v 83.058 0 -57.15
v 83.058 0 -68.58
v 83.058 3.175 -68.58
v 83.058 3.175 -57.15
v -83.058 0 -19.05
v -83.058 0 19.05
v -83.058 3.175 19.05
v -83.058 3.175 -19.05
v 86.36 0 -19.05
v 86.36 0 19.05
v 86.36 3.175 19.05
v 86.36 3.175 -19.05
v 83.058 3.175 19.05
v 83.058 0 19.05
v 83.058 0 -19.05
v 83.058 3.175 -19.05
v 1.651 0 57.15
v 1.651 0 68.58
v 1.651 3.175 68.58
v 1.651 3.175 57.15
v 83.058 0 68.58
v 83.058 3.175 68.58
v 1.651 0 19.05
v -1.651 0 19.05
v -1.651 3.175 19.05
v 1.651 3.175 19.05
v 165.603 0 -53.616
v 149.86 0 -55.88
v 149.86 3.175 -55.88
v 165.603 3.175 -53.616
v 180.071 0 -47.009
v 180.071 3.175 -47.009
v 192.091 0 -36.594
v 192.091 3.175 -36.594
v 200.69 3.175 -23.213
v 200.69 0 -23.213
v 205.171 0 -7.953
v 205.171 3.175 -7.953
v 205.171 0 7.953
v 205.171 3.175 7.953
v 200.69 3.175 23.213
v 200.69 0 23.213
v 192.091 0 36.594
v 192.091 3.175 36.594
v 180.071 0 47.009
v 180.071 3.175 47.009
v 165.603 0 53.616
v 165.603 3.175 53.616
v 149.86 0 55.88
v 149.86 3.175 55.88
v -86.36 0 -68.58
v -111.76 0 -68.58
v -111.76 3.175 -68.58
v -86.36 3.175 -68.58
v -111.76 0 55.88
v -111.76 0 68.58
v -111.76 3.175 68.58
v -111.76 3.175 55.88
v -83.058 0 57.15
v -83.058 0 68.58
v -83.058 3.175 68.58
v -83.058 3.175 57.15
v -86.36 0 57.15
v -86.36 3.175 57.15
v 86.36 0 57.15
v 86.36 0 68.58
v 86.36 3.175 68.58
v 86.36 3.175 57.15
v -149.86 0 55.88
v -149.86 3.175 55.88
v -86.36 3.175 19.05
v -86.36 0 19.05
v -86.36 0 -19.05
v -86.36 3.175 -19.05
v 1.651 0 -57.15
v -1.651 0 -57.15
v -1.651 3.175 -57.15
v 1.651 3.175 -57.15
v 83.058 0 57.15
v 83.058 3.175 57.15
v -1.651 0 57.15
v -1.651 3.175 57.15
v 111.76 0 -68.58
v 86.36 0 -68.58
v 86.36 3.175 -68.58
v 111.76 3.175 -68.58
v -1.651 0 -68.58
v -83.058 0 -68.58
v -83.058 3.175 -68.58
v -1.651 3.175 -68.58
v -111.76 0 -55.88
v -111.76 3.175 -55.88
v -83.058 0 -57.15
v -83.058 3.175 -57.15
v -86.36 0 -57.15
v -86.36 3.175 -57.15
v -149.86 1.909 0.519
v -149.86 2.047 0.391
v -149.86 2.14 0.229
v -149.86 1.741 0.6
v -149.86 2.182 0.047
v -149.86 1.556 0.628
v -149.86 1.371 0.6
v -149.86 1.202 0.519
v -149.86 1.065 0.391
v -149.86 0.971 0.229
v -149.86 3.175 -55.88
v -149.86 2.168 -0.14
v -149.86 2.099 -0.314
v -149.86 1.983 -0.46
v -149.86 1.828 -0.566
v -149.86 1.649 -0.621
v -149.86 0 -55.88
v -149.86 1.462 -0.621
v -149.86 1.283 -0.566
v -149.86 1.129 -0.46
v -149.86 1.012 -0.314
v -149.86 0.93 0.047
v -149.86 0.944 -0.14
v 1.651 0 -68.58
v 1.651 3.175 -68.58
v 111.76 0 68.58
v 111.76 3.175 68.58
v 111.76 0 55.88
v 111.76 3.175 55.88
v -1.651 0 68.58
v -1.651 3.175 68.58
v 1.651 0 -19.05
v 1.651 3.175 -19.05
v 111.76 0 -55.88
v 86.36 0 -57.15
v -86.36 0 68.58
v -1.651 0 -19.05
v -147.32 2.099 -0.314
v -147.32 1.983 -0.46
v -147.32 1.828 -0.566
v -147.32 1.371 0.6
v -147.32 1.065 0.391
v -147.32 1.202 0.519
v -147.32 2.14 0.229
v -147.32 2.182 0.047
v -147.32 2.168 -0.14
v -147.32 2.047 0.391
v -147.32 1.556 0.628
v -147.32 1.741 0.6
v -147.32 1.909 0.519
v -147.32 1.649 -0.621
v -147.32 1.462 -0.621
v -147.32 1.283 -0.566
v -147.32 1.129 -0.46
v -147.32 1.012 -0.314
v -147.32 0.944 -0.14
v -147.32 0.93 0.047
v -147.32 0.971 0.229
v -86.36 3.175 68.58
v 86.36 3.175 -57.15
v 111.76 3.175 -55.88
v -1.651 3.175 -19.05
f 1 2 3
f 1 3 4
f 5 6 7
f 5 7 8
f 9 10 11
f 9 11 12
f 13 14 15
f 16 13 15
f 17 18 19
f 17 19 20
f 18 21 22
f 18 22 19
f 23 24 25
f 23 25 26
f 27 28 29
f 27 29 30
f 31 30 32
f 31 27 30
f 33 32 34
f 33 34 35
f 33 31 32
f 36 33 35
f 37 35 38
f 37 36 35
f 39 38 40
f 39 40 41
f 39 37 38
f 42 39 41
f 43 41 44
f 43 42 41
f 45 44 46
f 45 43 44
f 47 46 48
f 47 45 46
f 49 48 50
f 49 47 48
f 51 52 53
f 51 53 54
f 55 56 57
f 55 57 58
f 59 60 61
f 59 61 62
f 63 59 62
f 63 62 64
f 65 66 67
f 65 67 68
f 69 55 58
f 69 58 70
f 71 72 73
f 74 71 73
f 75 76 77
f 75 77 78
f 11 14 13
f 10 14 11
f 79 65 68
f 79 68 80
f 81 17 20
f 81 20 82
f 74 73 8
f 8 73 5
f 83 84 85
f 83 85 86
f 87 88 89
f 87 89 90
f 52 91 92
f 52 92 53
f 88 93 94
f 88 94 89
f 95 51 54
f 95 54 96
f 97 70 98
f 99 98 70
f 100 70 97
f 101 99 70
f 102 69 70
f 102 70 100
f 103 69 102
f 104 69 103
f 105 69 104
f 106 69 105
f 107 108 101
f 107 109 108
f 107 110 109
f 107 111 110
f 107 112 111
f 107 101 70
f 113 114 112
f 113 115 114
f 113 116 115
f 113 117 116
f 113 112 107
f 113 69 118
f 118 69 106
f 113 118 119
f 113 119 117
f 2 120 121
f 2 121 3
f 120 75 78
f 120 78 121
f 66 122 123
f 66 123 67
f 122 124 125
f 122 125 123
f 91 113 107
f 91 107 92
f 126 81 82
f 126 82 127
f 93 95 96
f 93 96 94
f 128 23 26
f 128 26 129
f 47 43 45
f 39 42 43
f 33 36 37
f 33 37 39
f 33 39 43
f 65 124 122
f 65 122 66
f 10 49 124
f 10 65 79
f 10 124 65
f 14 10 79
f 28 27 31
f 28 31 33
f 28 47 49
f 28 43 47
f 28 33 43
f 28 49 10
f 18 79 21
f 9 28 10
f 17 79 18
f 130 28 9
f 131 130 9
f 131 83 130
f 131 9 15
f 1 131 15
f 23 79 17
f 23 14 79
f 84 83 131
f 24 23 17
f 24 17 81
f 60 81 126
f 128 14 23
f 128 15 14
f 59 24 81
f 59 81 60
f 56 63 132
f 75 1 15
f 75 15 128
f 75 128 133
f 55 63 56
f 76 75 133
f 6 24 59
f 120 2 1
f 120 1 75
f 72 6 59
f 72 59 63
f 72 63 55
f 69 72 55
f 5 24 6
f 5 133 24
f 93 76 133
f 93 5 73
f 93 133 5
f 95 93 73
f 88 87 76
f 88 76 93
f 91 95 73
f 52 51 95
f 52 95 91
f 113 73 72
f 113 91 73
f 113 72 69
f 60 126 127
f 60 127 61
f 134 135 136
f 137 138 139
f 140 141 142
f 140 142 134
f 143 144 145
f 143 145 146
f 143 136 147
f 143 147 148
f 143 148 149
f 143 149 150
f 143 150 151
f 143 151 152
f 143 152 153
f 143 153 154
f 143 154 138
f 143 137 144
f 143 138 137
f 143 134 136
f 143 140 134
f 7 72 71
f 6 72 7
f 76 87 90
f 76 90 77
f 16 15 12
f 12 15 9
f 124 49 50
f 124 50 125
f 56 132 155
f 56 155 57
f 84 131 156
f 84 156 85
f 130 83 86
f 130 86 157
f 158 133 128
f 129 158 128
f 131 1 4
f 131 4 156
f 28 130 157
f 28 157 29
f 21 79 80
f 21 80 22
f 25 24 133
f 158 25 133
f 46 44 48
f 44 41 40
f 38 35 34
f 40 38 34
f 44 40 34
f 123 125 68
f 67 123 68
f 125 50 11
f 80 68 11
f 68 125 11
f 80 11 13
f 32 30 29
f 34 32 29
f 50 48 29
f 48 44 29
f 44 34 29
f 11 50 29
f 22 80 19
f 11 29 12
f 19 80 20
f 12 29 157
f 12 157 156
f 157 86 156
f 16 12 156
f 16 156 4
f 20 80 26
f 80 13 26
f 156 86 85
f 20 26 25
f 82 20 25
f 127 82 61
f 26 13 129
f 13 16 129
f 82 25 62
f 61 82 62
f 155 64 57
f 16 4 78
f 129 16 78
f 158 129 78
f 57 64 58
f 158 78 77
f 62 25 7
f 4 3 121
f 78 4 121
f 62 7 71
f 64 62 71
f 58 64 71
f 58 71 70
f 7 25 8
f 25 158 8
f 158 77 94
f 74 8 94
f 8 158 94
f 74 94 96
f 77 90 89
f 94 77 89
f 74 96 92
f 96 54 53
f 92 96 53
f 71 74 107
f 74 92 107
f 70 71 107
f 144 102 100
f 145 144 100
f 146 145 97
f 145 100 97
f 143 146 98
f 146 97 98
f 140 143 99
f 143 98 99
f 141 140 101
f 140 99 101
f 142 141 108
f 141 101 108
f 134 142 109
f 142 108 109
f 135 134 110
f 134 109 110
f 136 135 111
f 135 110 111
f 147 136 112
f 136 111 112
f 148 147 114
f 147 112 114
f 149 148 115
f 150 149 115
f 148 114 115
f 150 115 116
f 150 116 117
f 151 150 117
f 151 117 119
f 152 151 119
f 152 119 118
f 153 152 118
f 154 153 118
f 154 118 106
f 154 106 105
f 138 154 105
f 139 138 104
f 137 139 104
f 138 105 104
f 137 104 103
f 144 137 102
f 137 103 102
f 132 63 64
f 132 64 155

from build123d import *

# Parameters (mm, degrees)
SKETCH1_W           = 3.302
SKETCH1_H           = 38.1
BOSS_EXTRUDE1_DEPTH = 3.175
SKETCH2_R           = 0.627804746
CUT_EXTRUDE1_DEPTH  = 2.54


with BuildPart() as part:
    # Sketch1 → Boss-Extrude1 (new body)
    with BuildSketch(Plane(origin=(0, 0, 0), x_dir=(1, 0, 0), z_dir=(0, 1, 0))):
        with BuildLine():
            Line((-149.86, -55.88), (-149.86, 55.88))
            Line((-149.86, 55.88), (-111.76, 55.88))
            Line((-111.76, 55.88), (-111.76, 68.58))
            Line((-111.76, 68.58), (-86.36, 68.58))
            Line((-86.36, 68.58), (-86.36, 57.15))
            Line((-86.36, 57.15), (-83.058, 57.15))
            Line((-83.058, 57.15), (-83.058, 68.58))
            Line((-83.058, 68.58), (-1.651, 68.58))
            Line((-1.651, 68.58), (-1.651, 57.15))
            Line((-1.651, 57.15), (1.651, 57.15))
            Line((1.651, 57.15), (1.651, 68.58))
            Line((1.651, 68.58), (83.058, 68.58))
            Line((83.058, 68.58), (83.058, 57.15))
            Line((83.058, 57.15), (86.36, 57.15))
            Line((86.36, 57.15), (86.36, 68.58))
            Line((86.36, 68.58), (111.76, 68.58))
            Line((111.76, 68.58), (111.76, 55.88))
            Line((111.76, 55.88), (149.86, 55.88))
            ThreePointArc((149.86, 55.88), (205.74, 0), (149.86, -55.88))
            Line((149.86, -55.88), (111.76, -55.88))
            Line((111.76, -55.88), (111.76, -68.58))
            Line((111.76, -68.58), (86.36, -68.58))
            Line((86.36, -68.58), (86.36, -57.15))
            Line((86.36, -57.15), (83.058, -57.15))
            Line((83.058, -57.15), (83.058, -68.58))
            Line((83.058, -68.58), (1.651, -68.58))
            Line((1.651, -68.58), (1.651, -57.15))
            Line((1.651, -57.15), (-1.651, -57.15))
            Line((-1.651, -57.15), (-1.651, -68.58))
            Line((-1.651, -68.58), (-83.058, -68.58))
            Line((-83.058, -68.58), (-83.058, -57.15))
            Line((-83.058, -57.15), (-86.36, -57.15))
            Line((-86.36, -57.15), (-86.36, -68.58))
            Line((-86.36, -68.58), (-111.76, -68.58))
            Line((-111.76, -68.58), (-111.76, -55.88))
            Line((-111.76, -55.88), (-149.86, -55.88))
        make_face()
        Rectangle(SKETCH1_W, SKETCH1_H, mode=Mode.SUBTRACT)
        with Locations((-84.709, 0)):
            Rectangle(SKETCH1_W, SKETCH1_H, mode=Mode.SUBTRACT)
        with Locations((84.709, 0)):
            Rectangle(SKETCH1_W, SKETCH1_H, mode=Mode.SUBTRACT)
    extrude(amount=BOSS_EXTRUDE1_DEPTH)

    # Sketch2 → Cut-Extrude1 (cut)
    with BuildSketch(Plane.ZY.offset(149.86)):
        with Locations((0, 1.55575)):
            Circle(SKETCH2_R)
    extrude(amount=-CUT_EXTRUDE1_DEPTH, mode=Mode.SUBTRACT)


solid = part.part
